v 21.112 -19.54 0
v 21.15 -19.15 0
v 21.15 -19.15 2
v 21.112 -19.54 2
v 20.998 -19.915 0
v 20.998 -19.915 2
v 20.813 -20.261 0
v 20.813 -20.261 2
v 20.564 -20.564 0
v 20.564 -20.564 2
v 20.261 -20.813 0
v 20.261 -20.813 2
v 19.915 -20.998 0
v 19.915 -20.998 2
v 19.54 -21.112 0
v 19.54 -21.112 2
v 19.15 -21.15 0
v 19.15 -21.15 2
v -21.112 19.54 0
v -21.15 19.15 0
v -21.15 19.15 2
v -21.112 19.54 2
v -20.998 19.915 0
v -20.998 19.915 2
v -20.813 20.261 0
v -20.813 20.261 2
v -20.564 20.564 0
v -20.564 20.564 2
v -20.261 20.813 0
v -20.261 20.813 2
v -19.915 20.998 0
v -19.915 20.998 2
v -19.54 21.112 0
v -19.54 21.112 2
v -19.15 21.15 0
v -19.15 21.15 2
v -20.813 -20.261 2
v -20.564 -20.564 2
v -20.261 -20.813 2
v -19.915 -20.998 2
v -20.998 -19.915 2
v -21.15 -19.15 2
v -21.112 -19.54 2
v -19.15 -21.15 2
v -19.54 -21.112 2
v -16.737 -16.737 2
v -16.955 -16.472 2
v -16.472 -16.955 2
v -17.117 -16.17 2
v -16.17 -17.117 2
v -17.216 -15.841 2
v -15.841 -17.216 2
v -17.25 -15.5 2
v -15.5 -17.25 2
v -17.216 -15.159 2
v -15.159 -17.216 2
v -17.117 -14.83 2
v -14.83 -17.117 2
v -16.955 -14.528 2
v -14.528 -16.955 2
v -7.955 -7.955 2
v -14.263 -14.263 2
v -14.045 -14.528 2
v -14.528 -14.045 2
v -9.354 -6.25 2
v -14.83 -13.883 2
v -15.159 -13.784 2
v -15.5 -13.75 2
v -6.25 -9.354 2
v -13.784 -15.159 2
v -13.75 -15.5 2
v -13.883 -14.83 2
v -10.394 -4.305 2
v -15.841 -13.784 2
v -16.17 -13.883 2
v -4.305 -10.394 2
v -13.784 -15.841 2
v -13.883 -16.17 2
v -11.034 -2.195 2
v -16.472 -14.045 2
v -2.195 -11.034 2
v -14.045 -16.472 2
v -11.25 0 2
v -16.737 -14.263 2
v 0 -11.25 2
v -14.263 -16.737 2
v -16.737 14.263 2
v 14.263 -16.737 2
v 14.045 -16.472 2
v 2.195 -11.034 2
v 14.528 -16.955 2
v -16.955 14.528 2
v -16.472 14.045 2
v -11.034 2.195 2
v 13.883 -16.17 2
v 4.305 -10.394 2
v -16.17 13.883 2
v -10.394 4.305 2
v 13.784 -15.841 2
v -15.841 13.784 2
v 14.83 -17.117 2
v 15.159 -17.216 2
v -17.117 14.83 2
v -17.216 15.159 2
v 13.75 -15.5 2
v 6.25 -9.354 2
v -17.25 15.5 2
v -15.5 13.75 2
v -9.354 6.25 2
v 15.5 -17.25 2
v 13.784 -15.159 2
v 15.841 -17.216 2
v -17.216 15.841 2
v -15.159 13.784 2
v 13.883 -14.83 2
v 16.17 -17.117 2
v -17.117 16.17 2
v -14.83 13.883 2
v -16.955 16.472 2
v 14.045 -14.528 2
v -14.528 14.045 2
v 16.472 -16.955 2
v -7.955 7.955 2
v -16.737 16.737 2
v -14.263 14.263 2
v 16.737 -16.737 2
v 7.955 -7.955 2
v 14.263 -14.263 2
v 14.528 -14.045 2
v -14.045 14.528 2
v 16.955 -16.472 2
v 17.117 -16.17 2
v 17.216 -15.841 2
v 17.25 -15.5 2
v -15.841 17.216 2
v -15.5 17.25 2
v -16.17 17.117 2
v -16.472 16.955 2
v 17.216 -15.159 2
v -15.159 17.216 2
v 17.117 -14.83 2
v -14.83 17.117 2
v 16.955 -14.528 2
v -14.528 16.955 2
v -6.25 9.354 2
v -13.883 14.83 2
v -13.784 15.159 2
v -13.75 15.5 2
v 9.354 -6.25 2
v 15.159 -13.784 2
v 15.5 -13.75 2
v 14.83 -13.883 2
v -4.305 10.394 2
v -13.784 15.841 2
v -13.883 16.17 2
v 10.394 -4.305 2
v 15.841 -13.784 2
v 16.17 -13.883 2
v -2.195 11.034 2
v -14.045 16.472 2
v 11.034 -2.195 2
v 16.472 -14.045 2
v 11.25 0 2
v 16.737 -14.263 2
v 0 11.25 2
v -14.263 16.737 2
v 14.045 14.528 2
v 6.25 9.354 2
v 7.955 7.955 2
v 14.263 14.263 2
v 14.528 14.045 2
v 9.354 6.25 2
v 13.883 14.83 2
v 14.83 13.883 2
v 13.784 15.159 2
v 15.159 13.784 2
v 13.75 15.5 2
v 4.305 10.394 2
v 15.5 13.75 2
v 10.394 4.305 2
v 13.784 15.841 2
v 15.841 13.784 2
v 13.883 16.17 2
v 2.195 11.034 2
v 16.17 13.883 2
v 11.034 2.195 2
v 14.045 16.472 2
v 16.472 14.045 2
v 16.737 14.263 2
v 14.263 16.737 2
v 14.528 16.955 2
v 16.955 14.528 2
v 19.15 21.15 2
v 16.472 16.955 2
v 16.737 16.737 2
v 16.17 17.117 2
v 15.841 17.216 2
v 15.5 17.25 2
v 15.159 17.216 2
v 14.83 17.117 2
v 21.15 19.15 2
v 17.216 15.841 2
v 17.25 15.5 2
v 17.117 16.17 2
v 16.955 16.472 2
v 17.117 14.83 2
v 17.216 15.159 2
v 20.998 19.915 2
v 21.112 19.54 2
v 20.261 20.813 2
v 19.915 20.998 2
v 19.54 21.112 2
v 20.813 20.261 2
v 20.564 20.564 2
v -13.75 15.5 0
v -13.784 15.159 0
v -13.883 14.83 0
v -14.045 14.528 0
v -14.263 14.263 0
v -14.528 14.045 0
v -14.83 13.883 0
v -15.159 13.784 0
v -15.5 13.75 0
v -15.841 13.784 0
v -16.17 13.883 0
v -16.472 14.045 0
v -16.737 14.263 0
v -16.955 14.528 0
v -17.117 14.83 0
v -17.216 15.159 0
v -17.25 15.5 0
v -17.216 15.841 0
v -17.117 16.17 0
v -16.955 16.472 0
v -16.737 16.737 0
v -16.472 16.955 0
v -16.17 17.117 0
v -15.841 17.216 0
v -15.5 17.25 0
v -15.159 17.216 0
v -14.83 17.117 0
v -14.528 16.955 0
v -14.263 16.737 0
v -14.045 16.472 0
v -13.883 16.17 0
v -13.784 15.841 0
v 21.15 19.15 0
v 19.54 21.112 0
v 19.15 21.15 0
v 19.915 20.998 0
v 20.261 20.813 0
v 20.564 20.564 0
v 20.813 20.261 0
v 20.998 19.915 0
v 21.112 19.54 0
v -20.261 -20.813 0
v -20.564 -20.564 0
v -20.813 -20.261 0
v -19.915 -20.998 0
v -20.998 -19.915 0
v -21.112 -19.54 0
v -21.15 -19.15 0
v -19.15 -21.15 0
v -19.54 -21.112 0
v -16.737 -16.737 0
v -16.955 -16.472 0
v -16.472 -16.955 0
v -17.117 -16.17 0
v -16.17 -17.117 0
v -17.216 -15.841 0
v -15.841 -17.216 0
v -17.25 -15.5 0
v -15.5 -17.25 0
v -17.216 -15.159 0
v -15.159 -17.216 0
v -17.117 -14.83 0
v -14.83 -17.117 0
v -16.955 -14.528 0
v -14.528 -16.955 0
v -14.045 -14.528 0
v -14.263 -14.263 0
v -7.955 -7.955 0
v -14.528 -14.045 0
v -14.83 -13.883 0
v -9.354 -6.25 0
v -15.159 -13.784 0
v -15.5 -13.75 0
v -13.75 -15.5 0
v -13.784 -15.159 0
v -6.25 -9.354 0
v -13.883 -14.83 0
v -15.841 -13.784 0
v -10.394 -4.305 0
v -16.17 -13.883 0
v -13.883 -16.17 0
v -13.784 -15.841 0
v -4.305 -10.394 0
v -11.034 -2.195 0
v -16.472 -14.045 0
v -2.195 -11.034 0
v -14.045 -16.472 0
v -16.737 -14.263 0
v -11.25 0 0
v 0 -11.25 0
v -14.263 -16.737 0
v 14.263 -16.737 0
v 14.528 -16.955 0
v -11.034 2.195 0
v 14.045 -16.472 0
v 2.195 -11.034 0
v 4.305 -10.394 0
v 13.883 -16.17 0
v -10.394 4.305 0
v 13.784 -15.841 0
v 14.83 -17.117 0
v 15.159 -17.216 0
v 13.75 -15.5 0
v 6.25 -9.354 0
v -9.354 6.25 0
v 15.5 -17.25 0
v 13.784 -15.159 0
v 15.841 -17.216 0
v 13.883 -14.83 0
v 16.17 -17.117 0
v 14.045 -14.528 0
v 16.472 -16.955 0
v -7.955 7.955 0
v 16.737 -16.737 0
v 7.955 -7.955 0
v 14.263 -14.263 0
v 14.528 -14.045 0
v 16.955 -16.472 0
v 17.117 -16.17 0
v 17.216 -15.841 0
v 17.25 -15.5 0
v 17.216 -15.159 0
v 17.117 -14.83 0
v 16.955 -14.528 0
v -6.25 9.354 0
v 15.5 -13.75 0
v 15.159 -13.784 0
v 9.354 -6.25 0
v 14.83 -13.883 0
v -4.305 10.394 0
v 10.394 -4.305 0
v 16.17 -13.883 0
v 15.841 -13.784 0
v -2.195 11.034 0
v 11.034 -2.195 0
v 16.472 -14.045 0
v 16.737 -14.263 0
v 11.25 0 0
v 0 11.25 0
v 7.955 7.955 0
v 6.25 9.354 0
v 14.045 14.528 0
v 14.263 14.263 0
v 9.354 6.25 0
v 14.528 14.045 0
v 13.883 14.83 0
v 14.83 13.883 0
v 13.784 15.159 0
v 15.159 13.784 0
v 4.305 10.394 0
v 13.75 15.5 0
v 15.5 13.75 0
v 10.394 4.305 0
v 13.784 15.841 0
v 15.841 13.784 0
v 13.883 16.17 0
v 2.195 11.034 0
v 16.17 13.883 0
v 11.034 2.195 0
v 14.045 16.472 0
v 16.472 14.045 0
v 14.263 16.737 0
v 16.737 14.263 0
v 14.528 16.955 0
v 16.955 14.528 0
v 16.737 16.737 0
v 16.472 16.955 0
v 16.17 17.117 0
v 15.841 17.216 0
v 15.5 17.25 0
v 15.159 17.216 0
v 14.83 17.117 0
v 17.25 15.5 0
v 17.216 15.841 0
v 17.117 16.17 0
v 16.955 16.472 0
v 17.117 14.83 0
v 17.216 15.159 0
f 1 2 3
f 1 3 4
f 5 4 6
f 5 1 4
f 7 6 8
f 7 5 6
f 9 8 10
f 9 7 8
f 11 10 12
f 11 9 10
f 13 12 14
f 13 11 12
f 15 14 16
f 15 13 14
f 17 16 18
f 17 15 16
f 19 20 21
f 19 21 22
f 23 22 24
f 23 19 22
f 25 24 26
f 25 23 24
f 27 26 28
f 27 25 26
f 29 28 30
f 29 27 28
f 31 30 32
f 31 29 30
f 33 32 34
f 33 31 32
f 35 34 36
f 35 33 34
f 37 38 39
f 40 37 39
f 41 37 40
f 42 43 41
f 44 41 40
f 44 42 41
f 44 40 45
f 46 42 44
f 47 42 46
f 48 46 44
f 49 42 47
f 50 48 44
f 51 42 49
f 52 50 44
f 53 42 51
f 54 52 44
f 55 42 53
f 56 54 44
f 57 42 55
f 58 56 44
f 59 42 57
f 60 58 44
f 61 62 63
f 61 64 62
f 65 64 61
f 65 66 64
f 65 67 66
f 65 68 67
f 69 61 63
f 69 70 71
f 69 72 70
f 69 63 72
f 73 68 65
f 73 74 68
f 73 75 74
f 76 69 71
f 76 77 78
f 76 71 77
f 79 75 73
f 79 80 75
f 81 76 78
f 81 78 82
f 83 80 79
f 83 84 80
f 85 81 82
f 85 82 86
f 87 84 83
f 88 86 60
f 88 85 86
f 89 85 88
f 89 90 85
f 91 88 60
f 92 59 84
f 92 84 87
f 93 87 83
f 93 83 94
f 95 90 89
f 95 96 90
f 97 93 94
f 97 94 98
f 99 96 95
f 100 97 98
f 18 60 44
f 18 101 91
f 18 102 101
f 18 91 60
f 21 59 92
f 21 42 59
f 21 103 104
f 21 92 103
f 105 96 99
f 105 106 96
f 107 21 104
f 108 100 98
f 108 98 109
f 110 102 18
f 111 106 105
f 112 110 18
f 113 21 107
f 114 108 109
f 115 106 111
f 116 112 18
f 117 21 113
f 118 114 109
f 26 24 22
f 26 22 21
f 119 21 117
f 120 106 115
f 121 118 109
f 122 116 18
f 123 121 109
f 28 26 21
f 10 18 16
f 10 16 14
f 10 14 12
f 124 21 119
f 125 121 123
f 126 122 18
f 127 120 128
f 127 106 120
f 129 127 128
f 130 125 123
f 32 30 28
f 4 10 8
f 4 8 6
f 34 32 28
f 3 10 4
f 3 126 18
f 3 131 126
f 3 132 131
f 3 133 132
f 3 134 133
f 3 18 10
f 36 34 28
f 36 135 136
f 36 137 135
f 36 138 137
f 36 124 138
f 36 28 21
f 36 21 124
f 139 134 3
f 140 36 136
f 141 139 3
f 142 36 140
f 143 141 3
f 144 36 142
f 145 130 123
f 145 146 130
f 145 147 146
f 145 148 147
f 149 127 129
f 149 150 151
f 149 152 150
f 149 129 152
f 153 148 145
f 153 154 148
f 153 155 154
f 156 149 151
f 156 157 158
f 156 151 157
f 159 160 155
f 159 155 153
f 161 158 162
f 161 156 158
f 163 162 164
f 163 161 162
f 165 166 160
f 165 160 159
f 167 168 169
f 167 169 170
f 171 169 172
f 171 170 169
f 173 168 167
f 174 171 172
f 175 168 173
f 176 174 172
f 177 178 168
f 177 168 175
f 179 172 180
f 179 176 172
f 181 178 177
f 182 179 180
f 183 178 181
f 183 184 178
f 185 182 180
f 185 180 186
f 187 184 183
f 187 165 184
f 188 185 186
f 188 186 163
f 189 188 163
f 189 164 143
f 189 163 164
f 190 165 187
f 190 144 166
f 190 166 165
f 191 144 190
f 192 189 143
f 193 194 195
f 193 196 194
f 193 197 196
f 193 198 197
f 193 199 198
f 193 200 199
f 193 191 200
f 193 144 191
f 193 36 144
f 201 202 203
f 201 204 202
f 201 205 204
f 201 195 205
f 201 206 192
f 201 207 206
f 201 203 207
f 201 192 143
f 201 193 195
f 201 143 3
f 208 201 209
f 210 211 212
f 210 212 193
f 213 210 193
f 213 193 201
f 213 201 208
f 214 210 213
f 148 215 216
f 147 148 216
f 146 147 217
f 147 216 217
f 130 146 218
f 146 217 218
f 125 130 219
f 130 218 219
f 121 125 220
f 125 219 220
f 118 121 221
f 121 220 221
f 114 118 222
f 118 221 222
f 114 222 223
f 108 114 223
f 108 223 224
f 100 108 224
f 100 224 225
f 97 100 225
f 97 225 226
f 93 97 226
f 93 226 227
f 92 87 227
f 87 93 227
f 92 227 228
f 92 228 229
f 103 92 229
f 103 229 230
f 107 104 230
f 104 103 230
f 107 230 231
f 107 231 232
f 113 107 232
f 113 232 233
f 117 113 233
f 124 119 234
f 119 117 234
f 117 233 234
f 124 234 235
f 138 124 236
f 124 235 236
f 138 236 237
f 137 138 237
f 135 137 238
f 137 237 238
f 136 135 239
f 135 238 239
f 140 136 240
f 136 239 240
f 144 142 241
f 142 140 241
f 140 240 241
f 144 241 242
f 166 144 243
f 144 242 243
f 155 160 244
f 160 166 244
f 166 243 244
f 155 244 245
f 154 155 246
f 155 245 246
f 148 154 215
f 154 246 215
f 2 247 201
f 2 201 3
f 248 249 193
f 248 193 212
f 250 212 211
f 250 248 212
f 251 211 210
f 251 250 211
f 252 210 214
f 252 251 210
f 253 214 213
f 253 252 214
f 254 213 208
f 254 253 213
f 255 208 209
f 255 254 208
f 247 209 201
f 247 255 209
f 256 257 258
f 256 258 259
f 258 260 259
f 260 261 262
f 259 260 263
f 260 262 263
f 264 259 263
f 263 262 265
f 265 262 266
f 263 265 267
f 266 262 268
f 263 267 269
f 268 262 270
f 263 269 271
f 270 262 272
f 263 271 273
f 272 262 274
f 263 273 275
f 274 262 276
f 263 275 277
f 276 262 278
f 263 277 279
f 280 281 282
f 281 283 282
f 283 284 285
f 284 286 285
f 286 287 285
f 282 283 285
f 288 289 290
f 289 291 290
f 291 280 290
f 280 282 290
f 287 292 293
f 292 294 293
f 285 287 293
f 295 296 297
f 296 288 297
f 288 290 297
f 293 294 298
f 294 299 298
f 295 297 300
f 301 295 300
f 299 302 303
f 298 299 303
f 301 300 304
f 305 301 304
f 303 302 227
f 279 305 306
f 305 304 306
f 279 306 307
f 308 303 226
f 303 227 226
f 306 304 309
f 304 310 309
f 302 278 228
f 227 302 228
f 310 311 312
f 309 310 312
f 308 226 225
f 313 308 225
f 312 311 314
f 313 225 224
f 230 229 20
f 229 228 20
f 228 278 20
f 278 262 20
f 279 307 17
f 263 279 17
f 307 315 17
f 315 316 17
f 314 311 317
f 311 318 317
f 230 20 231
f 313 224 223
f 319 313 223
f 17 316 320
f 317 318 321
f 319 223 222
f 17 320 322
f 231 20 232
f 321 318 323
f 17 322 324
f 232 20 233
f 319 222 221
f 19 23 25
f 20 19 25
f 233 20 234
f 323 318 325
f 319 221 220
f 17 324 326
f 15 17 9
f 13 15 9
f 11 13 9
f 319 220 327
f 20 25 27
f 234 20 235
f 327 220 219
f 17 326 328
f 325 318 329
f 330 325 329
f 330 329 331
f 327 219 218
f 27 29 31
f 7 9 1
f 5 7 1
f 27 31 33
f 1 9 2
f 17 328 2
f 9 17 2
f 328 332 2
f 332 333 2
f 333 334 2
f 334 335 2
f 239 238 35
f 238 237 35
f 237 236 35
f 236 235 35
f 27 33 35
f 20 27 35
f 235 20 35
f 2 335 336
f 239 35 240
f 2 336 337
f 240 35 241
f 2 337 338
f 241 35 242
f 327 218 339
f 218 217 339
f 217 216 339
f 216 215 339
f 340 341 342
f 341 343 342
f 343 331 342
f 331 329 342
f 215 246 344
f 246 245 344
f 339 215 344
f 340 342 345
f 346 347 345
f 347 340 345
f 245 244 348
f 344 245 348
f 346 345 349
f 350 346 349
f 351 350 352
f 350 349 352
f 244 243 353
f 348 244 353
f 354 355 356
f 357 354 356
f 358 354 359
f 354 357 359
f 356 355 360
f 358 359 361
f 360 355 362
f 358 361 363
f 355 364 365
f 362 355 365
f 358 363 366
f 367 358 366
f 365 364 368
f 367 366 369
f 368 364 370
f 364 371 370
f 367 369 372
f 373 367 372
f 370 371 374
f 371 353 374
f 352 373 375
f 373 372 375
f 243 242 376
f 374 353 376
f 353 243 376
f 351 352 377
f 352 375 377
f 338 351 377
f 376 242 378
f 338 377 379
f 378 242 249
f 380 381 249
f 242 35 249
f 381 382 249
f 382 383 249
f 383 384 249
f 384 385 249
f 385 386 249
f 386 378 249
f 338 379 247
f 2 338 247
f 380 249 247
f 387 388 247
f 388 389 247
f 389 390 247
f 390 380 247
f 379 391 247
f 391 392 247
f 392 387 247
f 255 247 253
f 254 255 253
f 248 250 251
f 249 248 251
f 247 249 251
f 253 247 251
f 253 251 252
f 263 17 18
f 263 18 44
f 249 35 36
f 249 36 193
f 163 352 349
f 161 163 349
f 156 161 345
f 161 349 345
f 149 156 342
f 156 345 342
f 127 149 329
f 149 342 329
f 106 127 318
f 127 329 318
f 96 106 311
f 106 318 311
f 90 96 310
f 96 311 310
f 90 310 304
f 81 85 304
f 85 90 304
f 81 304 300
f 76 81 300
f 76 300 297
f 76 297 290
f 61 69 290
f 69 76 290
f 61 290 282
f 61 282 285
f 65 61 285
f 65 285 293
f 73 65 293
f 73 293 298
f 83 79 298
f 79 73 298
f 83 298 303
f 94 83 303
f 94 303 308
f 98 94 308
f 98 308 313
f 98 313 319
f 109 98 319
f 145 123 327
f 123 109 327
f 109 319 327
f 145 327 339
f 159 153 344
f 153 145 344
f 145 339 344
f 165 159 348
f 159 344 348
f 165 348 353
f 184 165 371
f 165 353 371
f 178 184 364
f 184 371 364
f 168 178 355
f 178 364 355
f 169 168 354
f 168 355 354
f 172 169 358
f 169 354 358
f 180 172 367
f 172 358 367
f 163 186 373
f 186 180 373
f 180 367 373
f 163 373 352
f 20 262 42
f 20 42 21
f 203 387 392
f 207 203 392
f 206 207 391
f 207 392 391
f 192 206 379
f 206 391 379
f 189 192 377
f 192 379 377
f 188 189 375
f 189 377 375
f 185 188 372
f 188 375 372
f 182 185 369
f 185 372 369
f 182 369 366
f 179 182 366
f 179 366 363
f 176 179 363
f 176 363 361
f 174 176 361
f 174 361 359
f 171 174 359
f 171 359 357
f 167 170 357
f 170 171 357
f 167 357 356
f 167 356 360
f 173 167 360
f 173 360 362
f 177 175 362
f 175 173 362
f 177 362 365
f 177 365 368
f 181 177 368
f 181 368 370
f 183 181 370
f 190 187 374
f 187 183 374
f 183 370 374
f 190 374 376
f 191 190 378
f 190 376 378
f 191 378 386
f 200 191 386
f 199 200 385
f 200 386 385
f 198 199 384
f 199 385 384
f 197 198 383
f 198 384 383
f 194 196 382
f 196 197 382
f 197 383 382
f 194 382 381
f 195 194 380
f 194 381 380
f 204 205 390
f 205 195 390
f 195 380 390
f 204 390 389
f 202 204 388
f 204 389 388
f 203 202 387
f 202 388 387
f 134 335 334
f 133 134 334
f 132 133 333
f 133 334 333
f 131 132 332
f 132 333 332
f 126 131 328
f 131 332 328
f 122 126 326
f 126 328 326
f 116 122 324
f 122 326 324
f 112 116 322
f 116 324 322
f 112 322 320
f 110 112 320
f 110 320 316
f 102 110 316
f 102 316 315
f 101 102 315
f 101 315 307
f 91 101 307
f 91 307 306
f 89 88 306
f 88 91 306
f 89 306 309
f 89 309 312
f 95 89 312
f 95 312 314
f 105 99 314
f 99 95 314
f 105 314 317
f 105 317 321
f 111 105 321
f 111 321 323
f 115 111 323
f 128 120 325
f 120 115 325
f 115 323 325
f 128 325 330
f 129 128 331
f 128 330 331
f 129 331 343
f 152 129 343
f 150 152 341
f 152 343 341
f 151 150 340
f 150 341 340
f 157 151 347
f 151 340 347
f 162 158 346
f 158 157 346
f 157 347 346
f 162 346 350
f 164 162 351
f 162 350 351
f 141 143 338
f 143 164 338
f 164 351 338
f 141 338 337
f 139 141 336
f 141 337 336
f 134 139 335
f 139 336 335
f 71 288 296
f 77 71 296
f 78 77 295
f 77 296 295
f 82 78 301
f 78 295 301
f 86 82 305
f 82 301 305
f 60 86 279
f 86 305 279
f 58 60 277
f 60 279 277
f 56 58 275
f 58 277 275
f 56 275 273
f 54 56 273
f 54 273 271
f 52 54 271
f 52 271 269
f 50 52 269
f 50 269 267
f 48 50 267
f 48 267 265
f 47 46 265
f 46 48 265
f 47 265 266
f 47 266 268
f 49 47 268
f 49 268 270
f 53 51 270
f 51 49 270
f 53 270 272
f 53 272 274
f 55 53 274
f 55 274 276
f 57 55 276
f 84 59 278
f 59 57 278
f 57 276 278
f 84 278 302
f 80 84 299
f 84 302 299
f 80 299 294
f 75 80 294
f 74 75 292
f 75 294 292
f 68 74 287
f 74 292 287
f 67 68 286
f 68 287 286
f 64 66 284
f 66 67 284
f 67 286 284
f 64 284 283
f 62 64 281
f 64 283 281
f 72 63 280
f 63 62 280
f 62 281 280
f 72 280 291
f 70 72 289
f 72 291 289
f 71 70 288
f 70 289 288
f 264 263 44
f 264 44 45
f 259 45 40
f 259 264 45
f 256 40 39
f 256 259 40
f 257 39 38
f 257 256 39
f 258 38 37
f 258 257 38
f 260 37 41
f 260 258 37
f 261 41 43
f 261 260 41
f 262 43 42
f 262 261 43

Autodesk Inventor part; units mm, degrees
ref_plane "YZ Plane" through (0, 0, 0) normal (1, 0, 0) x (0, 1, 0)
ref_plane "XZ Plane" through (0, 0, 0) normal (0, 1, 0) x (-1, 0, 0)
ref_plane "XY Plane" through (0, 0, 0) normal (0, 0, 1) x (1, 0, 0)
sketch "Sketch1" plane through (0, 0, 0) normal (0, 0, 1) x (1, 0, 0)
  line L0 (19.15, -21.15) -> (-19.15, -21.15)
  line L1 (-21.15, -19.15) -> (-21.15, 19.15)
  line L2 (-19.15, 21.15) -> (19.15, 21.15)
  line L3 (21.15, 19.15) -> (21.15, -19.15)
  line L4 (21.15, -21.15) -> (-21.15, 21.15) construction
  line L5 (-21.15, -21.15) -> (21.15, 21.15) construction
  circle A0 centre (0, 0) radius 11.25
  line L6 (15.5, -15.5) -> (-15.5, -15.5) construction
  line L7 (-15.5, -15.5) -> (-15.5, 15.5) construction
  line L8 (-15.5, 15.5) -> (15.5, 15.5) construction
  line L9 (15.5, 15.5) -> (15.5, -15.5) construction
  line L10 (15.5, -15.5) -> (-15.5, 15.5) construction
  line L11 (-15.5, -15.5) -> (15.5, 15.5) construction
  circle A1 centre (15.5, 15.5) radius 1.75
  circle A2 centre (15.5, -15.5) radius 1.75
  circle A3 centre (-15.5, -15.5) radius 1.75
  circle A4 centre (-15.5, 15.5) radius 1.75
  arc A5 (-19.15, 21.15) -> (-21.15, 19.15) centre (-19.15, 19.15) ccw
  arc A6 (21.15, 19.15) -> (19.15, 21.15) centre (19.15, 19.15) ccw
  arc A7 (19.15, -21.15) -> (21.15, -19.15) centre (19.15, -19.15) ccw
  arc A8 (-21.15, -19.15) -> (-19.15, -21.15) centre (-19.15, -19.15) ccw
  dimension "d0" = 42.3
  dimension "d1" = 42.3
  dimension "d2" = 22.5
  dimension "d3" = 31
  dimension "d4" = 31
  dimension "d5" = 3.5
  dimension "d6" = 2
extrude "Extrusion1" add sketch "Sketch1" along normal blind 2
properties part number "NEMA 17 Damper" material "Rubber, Silicone"
